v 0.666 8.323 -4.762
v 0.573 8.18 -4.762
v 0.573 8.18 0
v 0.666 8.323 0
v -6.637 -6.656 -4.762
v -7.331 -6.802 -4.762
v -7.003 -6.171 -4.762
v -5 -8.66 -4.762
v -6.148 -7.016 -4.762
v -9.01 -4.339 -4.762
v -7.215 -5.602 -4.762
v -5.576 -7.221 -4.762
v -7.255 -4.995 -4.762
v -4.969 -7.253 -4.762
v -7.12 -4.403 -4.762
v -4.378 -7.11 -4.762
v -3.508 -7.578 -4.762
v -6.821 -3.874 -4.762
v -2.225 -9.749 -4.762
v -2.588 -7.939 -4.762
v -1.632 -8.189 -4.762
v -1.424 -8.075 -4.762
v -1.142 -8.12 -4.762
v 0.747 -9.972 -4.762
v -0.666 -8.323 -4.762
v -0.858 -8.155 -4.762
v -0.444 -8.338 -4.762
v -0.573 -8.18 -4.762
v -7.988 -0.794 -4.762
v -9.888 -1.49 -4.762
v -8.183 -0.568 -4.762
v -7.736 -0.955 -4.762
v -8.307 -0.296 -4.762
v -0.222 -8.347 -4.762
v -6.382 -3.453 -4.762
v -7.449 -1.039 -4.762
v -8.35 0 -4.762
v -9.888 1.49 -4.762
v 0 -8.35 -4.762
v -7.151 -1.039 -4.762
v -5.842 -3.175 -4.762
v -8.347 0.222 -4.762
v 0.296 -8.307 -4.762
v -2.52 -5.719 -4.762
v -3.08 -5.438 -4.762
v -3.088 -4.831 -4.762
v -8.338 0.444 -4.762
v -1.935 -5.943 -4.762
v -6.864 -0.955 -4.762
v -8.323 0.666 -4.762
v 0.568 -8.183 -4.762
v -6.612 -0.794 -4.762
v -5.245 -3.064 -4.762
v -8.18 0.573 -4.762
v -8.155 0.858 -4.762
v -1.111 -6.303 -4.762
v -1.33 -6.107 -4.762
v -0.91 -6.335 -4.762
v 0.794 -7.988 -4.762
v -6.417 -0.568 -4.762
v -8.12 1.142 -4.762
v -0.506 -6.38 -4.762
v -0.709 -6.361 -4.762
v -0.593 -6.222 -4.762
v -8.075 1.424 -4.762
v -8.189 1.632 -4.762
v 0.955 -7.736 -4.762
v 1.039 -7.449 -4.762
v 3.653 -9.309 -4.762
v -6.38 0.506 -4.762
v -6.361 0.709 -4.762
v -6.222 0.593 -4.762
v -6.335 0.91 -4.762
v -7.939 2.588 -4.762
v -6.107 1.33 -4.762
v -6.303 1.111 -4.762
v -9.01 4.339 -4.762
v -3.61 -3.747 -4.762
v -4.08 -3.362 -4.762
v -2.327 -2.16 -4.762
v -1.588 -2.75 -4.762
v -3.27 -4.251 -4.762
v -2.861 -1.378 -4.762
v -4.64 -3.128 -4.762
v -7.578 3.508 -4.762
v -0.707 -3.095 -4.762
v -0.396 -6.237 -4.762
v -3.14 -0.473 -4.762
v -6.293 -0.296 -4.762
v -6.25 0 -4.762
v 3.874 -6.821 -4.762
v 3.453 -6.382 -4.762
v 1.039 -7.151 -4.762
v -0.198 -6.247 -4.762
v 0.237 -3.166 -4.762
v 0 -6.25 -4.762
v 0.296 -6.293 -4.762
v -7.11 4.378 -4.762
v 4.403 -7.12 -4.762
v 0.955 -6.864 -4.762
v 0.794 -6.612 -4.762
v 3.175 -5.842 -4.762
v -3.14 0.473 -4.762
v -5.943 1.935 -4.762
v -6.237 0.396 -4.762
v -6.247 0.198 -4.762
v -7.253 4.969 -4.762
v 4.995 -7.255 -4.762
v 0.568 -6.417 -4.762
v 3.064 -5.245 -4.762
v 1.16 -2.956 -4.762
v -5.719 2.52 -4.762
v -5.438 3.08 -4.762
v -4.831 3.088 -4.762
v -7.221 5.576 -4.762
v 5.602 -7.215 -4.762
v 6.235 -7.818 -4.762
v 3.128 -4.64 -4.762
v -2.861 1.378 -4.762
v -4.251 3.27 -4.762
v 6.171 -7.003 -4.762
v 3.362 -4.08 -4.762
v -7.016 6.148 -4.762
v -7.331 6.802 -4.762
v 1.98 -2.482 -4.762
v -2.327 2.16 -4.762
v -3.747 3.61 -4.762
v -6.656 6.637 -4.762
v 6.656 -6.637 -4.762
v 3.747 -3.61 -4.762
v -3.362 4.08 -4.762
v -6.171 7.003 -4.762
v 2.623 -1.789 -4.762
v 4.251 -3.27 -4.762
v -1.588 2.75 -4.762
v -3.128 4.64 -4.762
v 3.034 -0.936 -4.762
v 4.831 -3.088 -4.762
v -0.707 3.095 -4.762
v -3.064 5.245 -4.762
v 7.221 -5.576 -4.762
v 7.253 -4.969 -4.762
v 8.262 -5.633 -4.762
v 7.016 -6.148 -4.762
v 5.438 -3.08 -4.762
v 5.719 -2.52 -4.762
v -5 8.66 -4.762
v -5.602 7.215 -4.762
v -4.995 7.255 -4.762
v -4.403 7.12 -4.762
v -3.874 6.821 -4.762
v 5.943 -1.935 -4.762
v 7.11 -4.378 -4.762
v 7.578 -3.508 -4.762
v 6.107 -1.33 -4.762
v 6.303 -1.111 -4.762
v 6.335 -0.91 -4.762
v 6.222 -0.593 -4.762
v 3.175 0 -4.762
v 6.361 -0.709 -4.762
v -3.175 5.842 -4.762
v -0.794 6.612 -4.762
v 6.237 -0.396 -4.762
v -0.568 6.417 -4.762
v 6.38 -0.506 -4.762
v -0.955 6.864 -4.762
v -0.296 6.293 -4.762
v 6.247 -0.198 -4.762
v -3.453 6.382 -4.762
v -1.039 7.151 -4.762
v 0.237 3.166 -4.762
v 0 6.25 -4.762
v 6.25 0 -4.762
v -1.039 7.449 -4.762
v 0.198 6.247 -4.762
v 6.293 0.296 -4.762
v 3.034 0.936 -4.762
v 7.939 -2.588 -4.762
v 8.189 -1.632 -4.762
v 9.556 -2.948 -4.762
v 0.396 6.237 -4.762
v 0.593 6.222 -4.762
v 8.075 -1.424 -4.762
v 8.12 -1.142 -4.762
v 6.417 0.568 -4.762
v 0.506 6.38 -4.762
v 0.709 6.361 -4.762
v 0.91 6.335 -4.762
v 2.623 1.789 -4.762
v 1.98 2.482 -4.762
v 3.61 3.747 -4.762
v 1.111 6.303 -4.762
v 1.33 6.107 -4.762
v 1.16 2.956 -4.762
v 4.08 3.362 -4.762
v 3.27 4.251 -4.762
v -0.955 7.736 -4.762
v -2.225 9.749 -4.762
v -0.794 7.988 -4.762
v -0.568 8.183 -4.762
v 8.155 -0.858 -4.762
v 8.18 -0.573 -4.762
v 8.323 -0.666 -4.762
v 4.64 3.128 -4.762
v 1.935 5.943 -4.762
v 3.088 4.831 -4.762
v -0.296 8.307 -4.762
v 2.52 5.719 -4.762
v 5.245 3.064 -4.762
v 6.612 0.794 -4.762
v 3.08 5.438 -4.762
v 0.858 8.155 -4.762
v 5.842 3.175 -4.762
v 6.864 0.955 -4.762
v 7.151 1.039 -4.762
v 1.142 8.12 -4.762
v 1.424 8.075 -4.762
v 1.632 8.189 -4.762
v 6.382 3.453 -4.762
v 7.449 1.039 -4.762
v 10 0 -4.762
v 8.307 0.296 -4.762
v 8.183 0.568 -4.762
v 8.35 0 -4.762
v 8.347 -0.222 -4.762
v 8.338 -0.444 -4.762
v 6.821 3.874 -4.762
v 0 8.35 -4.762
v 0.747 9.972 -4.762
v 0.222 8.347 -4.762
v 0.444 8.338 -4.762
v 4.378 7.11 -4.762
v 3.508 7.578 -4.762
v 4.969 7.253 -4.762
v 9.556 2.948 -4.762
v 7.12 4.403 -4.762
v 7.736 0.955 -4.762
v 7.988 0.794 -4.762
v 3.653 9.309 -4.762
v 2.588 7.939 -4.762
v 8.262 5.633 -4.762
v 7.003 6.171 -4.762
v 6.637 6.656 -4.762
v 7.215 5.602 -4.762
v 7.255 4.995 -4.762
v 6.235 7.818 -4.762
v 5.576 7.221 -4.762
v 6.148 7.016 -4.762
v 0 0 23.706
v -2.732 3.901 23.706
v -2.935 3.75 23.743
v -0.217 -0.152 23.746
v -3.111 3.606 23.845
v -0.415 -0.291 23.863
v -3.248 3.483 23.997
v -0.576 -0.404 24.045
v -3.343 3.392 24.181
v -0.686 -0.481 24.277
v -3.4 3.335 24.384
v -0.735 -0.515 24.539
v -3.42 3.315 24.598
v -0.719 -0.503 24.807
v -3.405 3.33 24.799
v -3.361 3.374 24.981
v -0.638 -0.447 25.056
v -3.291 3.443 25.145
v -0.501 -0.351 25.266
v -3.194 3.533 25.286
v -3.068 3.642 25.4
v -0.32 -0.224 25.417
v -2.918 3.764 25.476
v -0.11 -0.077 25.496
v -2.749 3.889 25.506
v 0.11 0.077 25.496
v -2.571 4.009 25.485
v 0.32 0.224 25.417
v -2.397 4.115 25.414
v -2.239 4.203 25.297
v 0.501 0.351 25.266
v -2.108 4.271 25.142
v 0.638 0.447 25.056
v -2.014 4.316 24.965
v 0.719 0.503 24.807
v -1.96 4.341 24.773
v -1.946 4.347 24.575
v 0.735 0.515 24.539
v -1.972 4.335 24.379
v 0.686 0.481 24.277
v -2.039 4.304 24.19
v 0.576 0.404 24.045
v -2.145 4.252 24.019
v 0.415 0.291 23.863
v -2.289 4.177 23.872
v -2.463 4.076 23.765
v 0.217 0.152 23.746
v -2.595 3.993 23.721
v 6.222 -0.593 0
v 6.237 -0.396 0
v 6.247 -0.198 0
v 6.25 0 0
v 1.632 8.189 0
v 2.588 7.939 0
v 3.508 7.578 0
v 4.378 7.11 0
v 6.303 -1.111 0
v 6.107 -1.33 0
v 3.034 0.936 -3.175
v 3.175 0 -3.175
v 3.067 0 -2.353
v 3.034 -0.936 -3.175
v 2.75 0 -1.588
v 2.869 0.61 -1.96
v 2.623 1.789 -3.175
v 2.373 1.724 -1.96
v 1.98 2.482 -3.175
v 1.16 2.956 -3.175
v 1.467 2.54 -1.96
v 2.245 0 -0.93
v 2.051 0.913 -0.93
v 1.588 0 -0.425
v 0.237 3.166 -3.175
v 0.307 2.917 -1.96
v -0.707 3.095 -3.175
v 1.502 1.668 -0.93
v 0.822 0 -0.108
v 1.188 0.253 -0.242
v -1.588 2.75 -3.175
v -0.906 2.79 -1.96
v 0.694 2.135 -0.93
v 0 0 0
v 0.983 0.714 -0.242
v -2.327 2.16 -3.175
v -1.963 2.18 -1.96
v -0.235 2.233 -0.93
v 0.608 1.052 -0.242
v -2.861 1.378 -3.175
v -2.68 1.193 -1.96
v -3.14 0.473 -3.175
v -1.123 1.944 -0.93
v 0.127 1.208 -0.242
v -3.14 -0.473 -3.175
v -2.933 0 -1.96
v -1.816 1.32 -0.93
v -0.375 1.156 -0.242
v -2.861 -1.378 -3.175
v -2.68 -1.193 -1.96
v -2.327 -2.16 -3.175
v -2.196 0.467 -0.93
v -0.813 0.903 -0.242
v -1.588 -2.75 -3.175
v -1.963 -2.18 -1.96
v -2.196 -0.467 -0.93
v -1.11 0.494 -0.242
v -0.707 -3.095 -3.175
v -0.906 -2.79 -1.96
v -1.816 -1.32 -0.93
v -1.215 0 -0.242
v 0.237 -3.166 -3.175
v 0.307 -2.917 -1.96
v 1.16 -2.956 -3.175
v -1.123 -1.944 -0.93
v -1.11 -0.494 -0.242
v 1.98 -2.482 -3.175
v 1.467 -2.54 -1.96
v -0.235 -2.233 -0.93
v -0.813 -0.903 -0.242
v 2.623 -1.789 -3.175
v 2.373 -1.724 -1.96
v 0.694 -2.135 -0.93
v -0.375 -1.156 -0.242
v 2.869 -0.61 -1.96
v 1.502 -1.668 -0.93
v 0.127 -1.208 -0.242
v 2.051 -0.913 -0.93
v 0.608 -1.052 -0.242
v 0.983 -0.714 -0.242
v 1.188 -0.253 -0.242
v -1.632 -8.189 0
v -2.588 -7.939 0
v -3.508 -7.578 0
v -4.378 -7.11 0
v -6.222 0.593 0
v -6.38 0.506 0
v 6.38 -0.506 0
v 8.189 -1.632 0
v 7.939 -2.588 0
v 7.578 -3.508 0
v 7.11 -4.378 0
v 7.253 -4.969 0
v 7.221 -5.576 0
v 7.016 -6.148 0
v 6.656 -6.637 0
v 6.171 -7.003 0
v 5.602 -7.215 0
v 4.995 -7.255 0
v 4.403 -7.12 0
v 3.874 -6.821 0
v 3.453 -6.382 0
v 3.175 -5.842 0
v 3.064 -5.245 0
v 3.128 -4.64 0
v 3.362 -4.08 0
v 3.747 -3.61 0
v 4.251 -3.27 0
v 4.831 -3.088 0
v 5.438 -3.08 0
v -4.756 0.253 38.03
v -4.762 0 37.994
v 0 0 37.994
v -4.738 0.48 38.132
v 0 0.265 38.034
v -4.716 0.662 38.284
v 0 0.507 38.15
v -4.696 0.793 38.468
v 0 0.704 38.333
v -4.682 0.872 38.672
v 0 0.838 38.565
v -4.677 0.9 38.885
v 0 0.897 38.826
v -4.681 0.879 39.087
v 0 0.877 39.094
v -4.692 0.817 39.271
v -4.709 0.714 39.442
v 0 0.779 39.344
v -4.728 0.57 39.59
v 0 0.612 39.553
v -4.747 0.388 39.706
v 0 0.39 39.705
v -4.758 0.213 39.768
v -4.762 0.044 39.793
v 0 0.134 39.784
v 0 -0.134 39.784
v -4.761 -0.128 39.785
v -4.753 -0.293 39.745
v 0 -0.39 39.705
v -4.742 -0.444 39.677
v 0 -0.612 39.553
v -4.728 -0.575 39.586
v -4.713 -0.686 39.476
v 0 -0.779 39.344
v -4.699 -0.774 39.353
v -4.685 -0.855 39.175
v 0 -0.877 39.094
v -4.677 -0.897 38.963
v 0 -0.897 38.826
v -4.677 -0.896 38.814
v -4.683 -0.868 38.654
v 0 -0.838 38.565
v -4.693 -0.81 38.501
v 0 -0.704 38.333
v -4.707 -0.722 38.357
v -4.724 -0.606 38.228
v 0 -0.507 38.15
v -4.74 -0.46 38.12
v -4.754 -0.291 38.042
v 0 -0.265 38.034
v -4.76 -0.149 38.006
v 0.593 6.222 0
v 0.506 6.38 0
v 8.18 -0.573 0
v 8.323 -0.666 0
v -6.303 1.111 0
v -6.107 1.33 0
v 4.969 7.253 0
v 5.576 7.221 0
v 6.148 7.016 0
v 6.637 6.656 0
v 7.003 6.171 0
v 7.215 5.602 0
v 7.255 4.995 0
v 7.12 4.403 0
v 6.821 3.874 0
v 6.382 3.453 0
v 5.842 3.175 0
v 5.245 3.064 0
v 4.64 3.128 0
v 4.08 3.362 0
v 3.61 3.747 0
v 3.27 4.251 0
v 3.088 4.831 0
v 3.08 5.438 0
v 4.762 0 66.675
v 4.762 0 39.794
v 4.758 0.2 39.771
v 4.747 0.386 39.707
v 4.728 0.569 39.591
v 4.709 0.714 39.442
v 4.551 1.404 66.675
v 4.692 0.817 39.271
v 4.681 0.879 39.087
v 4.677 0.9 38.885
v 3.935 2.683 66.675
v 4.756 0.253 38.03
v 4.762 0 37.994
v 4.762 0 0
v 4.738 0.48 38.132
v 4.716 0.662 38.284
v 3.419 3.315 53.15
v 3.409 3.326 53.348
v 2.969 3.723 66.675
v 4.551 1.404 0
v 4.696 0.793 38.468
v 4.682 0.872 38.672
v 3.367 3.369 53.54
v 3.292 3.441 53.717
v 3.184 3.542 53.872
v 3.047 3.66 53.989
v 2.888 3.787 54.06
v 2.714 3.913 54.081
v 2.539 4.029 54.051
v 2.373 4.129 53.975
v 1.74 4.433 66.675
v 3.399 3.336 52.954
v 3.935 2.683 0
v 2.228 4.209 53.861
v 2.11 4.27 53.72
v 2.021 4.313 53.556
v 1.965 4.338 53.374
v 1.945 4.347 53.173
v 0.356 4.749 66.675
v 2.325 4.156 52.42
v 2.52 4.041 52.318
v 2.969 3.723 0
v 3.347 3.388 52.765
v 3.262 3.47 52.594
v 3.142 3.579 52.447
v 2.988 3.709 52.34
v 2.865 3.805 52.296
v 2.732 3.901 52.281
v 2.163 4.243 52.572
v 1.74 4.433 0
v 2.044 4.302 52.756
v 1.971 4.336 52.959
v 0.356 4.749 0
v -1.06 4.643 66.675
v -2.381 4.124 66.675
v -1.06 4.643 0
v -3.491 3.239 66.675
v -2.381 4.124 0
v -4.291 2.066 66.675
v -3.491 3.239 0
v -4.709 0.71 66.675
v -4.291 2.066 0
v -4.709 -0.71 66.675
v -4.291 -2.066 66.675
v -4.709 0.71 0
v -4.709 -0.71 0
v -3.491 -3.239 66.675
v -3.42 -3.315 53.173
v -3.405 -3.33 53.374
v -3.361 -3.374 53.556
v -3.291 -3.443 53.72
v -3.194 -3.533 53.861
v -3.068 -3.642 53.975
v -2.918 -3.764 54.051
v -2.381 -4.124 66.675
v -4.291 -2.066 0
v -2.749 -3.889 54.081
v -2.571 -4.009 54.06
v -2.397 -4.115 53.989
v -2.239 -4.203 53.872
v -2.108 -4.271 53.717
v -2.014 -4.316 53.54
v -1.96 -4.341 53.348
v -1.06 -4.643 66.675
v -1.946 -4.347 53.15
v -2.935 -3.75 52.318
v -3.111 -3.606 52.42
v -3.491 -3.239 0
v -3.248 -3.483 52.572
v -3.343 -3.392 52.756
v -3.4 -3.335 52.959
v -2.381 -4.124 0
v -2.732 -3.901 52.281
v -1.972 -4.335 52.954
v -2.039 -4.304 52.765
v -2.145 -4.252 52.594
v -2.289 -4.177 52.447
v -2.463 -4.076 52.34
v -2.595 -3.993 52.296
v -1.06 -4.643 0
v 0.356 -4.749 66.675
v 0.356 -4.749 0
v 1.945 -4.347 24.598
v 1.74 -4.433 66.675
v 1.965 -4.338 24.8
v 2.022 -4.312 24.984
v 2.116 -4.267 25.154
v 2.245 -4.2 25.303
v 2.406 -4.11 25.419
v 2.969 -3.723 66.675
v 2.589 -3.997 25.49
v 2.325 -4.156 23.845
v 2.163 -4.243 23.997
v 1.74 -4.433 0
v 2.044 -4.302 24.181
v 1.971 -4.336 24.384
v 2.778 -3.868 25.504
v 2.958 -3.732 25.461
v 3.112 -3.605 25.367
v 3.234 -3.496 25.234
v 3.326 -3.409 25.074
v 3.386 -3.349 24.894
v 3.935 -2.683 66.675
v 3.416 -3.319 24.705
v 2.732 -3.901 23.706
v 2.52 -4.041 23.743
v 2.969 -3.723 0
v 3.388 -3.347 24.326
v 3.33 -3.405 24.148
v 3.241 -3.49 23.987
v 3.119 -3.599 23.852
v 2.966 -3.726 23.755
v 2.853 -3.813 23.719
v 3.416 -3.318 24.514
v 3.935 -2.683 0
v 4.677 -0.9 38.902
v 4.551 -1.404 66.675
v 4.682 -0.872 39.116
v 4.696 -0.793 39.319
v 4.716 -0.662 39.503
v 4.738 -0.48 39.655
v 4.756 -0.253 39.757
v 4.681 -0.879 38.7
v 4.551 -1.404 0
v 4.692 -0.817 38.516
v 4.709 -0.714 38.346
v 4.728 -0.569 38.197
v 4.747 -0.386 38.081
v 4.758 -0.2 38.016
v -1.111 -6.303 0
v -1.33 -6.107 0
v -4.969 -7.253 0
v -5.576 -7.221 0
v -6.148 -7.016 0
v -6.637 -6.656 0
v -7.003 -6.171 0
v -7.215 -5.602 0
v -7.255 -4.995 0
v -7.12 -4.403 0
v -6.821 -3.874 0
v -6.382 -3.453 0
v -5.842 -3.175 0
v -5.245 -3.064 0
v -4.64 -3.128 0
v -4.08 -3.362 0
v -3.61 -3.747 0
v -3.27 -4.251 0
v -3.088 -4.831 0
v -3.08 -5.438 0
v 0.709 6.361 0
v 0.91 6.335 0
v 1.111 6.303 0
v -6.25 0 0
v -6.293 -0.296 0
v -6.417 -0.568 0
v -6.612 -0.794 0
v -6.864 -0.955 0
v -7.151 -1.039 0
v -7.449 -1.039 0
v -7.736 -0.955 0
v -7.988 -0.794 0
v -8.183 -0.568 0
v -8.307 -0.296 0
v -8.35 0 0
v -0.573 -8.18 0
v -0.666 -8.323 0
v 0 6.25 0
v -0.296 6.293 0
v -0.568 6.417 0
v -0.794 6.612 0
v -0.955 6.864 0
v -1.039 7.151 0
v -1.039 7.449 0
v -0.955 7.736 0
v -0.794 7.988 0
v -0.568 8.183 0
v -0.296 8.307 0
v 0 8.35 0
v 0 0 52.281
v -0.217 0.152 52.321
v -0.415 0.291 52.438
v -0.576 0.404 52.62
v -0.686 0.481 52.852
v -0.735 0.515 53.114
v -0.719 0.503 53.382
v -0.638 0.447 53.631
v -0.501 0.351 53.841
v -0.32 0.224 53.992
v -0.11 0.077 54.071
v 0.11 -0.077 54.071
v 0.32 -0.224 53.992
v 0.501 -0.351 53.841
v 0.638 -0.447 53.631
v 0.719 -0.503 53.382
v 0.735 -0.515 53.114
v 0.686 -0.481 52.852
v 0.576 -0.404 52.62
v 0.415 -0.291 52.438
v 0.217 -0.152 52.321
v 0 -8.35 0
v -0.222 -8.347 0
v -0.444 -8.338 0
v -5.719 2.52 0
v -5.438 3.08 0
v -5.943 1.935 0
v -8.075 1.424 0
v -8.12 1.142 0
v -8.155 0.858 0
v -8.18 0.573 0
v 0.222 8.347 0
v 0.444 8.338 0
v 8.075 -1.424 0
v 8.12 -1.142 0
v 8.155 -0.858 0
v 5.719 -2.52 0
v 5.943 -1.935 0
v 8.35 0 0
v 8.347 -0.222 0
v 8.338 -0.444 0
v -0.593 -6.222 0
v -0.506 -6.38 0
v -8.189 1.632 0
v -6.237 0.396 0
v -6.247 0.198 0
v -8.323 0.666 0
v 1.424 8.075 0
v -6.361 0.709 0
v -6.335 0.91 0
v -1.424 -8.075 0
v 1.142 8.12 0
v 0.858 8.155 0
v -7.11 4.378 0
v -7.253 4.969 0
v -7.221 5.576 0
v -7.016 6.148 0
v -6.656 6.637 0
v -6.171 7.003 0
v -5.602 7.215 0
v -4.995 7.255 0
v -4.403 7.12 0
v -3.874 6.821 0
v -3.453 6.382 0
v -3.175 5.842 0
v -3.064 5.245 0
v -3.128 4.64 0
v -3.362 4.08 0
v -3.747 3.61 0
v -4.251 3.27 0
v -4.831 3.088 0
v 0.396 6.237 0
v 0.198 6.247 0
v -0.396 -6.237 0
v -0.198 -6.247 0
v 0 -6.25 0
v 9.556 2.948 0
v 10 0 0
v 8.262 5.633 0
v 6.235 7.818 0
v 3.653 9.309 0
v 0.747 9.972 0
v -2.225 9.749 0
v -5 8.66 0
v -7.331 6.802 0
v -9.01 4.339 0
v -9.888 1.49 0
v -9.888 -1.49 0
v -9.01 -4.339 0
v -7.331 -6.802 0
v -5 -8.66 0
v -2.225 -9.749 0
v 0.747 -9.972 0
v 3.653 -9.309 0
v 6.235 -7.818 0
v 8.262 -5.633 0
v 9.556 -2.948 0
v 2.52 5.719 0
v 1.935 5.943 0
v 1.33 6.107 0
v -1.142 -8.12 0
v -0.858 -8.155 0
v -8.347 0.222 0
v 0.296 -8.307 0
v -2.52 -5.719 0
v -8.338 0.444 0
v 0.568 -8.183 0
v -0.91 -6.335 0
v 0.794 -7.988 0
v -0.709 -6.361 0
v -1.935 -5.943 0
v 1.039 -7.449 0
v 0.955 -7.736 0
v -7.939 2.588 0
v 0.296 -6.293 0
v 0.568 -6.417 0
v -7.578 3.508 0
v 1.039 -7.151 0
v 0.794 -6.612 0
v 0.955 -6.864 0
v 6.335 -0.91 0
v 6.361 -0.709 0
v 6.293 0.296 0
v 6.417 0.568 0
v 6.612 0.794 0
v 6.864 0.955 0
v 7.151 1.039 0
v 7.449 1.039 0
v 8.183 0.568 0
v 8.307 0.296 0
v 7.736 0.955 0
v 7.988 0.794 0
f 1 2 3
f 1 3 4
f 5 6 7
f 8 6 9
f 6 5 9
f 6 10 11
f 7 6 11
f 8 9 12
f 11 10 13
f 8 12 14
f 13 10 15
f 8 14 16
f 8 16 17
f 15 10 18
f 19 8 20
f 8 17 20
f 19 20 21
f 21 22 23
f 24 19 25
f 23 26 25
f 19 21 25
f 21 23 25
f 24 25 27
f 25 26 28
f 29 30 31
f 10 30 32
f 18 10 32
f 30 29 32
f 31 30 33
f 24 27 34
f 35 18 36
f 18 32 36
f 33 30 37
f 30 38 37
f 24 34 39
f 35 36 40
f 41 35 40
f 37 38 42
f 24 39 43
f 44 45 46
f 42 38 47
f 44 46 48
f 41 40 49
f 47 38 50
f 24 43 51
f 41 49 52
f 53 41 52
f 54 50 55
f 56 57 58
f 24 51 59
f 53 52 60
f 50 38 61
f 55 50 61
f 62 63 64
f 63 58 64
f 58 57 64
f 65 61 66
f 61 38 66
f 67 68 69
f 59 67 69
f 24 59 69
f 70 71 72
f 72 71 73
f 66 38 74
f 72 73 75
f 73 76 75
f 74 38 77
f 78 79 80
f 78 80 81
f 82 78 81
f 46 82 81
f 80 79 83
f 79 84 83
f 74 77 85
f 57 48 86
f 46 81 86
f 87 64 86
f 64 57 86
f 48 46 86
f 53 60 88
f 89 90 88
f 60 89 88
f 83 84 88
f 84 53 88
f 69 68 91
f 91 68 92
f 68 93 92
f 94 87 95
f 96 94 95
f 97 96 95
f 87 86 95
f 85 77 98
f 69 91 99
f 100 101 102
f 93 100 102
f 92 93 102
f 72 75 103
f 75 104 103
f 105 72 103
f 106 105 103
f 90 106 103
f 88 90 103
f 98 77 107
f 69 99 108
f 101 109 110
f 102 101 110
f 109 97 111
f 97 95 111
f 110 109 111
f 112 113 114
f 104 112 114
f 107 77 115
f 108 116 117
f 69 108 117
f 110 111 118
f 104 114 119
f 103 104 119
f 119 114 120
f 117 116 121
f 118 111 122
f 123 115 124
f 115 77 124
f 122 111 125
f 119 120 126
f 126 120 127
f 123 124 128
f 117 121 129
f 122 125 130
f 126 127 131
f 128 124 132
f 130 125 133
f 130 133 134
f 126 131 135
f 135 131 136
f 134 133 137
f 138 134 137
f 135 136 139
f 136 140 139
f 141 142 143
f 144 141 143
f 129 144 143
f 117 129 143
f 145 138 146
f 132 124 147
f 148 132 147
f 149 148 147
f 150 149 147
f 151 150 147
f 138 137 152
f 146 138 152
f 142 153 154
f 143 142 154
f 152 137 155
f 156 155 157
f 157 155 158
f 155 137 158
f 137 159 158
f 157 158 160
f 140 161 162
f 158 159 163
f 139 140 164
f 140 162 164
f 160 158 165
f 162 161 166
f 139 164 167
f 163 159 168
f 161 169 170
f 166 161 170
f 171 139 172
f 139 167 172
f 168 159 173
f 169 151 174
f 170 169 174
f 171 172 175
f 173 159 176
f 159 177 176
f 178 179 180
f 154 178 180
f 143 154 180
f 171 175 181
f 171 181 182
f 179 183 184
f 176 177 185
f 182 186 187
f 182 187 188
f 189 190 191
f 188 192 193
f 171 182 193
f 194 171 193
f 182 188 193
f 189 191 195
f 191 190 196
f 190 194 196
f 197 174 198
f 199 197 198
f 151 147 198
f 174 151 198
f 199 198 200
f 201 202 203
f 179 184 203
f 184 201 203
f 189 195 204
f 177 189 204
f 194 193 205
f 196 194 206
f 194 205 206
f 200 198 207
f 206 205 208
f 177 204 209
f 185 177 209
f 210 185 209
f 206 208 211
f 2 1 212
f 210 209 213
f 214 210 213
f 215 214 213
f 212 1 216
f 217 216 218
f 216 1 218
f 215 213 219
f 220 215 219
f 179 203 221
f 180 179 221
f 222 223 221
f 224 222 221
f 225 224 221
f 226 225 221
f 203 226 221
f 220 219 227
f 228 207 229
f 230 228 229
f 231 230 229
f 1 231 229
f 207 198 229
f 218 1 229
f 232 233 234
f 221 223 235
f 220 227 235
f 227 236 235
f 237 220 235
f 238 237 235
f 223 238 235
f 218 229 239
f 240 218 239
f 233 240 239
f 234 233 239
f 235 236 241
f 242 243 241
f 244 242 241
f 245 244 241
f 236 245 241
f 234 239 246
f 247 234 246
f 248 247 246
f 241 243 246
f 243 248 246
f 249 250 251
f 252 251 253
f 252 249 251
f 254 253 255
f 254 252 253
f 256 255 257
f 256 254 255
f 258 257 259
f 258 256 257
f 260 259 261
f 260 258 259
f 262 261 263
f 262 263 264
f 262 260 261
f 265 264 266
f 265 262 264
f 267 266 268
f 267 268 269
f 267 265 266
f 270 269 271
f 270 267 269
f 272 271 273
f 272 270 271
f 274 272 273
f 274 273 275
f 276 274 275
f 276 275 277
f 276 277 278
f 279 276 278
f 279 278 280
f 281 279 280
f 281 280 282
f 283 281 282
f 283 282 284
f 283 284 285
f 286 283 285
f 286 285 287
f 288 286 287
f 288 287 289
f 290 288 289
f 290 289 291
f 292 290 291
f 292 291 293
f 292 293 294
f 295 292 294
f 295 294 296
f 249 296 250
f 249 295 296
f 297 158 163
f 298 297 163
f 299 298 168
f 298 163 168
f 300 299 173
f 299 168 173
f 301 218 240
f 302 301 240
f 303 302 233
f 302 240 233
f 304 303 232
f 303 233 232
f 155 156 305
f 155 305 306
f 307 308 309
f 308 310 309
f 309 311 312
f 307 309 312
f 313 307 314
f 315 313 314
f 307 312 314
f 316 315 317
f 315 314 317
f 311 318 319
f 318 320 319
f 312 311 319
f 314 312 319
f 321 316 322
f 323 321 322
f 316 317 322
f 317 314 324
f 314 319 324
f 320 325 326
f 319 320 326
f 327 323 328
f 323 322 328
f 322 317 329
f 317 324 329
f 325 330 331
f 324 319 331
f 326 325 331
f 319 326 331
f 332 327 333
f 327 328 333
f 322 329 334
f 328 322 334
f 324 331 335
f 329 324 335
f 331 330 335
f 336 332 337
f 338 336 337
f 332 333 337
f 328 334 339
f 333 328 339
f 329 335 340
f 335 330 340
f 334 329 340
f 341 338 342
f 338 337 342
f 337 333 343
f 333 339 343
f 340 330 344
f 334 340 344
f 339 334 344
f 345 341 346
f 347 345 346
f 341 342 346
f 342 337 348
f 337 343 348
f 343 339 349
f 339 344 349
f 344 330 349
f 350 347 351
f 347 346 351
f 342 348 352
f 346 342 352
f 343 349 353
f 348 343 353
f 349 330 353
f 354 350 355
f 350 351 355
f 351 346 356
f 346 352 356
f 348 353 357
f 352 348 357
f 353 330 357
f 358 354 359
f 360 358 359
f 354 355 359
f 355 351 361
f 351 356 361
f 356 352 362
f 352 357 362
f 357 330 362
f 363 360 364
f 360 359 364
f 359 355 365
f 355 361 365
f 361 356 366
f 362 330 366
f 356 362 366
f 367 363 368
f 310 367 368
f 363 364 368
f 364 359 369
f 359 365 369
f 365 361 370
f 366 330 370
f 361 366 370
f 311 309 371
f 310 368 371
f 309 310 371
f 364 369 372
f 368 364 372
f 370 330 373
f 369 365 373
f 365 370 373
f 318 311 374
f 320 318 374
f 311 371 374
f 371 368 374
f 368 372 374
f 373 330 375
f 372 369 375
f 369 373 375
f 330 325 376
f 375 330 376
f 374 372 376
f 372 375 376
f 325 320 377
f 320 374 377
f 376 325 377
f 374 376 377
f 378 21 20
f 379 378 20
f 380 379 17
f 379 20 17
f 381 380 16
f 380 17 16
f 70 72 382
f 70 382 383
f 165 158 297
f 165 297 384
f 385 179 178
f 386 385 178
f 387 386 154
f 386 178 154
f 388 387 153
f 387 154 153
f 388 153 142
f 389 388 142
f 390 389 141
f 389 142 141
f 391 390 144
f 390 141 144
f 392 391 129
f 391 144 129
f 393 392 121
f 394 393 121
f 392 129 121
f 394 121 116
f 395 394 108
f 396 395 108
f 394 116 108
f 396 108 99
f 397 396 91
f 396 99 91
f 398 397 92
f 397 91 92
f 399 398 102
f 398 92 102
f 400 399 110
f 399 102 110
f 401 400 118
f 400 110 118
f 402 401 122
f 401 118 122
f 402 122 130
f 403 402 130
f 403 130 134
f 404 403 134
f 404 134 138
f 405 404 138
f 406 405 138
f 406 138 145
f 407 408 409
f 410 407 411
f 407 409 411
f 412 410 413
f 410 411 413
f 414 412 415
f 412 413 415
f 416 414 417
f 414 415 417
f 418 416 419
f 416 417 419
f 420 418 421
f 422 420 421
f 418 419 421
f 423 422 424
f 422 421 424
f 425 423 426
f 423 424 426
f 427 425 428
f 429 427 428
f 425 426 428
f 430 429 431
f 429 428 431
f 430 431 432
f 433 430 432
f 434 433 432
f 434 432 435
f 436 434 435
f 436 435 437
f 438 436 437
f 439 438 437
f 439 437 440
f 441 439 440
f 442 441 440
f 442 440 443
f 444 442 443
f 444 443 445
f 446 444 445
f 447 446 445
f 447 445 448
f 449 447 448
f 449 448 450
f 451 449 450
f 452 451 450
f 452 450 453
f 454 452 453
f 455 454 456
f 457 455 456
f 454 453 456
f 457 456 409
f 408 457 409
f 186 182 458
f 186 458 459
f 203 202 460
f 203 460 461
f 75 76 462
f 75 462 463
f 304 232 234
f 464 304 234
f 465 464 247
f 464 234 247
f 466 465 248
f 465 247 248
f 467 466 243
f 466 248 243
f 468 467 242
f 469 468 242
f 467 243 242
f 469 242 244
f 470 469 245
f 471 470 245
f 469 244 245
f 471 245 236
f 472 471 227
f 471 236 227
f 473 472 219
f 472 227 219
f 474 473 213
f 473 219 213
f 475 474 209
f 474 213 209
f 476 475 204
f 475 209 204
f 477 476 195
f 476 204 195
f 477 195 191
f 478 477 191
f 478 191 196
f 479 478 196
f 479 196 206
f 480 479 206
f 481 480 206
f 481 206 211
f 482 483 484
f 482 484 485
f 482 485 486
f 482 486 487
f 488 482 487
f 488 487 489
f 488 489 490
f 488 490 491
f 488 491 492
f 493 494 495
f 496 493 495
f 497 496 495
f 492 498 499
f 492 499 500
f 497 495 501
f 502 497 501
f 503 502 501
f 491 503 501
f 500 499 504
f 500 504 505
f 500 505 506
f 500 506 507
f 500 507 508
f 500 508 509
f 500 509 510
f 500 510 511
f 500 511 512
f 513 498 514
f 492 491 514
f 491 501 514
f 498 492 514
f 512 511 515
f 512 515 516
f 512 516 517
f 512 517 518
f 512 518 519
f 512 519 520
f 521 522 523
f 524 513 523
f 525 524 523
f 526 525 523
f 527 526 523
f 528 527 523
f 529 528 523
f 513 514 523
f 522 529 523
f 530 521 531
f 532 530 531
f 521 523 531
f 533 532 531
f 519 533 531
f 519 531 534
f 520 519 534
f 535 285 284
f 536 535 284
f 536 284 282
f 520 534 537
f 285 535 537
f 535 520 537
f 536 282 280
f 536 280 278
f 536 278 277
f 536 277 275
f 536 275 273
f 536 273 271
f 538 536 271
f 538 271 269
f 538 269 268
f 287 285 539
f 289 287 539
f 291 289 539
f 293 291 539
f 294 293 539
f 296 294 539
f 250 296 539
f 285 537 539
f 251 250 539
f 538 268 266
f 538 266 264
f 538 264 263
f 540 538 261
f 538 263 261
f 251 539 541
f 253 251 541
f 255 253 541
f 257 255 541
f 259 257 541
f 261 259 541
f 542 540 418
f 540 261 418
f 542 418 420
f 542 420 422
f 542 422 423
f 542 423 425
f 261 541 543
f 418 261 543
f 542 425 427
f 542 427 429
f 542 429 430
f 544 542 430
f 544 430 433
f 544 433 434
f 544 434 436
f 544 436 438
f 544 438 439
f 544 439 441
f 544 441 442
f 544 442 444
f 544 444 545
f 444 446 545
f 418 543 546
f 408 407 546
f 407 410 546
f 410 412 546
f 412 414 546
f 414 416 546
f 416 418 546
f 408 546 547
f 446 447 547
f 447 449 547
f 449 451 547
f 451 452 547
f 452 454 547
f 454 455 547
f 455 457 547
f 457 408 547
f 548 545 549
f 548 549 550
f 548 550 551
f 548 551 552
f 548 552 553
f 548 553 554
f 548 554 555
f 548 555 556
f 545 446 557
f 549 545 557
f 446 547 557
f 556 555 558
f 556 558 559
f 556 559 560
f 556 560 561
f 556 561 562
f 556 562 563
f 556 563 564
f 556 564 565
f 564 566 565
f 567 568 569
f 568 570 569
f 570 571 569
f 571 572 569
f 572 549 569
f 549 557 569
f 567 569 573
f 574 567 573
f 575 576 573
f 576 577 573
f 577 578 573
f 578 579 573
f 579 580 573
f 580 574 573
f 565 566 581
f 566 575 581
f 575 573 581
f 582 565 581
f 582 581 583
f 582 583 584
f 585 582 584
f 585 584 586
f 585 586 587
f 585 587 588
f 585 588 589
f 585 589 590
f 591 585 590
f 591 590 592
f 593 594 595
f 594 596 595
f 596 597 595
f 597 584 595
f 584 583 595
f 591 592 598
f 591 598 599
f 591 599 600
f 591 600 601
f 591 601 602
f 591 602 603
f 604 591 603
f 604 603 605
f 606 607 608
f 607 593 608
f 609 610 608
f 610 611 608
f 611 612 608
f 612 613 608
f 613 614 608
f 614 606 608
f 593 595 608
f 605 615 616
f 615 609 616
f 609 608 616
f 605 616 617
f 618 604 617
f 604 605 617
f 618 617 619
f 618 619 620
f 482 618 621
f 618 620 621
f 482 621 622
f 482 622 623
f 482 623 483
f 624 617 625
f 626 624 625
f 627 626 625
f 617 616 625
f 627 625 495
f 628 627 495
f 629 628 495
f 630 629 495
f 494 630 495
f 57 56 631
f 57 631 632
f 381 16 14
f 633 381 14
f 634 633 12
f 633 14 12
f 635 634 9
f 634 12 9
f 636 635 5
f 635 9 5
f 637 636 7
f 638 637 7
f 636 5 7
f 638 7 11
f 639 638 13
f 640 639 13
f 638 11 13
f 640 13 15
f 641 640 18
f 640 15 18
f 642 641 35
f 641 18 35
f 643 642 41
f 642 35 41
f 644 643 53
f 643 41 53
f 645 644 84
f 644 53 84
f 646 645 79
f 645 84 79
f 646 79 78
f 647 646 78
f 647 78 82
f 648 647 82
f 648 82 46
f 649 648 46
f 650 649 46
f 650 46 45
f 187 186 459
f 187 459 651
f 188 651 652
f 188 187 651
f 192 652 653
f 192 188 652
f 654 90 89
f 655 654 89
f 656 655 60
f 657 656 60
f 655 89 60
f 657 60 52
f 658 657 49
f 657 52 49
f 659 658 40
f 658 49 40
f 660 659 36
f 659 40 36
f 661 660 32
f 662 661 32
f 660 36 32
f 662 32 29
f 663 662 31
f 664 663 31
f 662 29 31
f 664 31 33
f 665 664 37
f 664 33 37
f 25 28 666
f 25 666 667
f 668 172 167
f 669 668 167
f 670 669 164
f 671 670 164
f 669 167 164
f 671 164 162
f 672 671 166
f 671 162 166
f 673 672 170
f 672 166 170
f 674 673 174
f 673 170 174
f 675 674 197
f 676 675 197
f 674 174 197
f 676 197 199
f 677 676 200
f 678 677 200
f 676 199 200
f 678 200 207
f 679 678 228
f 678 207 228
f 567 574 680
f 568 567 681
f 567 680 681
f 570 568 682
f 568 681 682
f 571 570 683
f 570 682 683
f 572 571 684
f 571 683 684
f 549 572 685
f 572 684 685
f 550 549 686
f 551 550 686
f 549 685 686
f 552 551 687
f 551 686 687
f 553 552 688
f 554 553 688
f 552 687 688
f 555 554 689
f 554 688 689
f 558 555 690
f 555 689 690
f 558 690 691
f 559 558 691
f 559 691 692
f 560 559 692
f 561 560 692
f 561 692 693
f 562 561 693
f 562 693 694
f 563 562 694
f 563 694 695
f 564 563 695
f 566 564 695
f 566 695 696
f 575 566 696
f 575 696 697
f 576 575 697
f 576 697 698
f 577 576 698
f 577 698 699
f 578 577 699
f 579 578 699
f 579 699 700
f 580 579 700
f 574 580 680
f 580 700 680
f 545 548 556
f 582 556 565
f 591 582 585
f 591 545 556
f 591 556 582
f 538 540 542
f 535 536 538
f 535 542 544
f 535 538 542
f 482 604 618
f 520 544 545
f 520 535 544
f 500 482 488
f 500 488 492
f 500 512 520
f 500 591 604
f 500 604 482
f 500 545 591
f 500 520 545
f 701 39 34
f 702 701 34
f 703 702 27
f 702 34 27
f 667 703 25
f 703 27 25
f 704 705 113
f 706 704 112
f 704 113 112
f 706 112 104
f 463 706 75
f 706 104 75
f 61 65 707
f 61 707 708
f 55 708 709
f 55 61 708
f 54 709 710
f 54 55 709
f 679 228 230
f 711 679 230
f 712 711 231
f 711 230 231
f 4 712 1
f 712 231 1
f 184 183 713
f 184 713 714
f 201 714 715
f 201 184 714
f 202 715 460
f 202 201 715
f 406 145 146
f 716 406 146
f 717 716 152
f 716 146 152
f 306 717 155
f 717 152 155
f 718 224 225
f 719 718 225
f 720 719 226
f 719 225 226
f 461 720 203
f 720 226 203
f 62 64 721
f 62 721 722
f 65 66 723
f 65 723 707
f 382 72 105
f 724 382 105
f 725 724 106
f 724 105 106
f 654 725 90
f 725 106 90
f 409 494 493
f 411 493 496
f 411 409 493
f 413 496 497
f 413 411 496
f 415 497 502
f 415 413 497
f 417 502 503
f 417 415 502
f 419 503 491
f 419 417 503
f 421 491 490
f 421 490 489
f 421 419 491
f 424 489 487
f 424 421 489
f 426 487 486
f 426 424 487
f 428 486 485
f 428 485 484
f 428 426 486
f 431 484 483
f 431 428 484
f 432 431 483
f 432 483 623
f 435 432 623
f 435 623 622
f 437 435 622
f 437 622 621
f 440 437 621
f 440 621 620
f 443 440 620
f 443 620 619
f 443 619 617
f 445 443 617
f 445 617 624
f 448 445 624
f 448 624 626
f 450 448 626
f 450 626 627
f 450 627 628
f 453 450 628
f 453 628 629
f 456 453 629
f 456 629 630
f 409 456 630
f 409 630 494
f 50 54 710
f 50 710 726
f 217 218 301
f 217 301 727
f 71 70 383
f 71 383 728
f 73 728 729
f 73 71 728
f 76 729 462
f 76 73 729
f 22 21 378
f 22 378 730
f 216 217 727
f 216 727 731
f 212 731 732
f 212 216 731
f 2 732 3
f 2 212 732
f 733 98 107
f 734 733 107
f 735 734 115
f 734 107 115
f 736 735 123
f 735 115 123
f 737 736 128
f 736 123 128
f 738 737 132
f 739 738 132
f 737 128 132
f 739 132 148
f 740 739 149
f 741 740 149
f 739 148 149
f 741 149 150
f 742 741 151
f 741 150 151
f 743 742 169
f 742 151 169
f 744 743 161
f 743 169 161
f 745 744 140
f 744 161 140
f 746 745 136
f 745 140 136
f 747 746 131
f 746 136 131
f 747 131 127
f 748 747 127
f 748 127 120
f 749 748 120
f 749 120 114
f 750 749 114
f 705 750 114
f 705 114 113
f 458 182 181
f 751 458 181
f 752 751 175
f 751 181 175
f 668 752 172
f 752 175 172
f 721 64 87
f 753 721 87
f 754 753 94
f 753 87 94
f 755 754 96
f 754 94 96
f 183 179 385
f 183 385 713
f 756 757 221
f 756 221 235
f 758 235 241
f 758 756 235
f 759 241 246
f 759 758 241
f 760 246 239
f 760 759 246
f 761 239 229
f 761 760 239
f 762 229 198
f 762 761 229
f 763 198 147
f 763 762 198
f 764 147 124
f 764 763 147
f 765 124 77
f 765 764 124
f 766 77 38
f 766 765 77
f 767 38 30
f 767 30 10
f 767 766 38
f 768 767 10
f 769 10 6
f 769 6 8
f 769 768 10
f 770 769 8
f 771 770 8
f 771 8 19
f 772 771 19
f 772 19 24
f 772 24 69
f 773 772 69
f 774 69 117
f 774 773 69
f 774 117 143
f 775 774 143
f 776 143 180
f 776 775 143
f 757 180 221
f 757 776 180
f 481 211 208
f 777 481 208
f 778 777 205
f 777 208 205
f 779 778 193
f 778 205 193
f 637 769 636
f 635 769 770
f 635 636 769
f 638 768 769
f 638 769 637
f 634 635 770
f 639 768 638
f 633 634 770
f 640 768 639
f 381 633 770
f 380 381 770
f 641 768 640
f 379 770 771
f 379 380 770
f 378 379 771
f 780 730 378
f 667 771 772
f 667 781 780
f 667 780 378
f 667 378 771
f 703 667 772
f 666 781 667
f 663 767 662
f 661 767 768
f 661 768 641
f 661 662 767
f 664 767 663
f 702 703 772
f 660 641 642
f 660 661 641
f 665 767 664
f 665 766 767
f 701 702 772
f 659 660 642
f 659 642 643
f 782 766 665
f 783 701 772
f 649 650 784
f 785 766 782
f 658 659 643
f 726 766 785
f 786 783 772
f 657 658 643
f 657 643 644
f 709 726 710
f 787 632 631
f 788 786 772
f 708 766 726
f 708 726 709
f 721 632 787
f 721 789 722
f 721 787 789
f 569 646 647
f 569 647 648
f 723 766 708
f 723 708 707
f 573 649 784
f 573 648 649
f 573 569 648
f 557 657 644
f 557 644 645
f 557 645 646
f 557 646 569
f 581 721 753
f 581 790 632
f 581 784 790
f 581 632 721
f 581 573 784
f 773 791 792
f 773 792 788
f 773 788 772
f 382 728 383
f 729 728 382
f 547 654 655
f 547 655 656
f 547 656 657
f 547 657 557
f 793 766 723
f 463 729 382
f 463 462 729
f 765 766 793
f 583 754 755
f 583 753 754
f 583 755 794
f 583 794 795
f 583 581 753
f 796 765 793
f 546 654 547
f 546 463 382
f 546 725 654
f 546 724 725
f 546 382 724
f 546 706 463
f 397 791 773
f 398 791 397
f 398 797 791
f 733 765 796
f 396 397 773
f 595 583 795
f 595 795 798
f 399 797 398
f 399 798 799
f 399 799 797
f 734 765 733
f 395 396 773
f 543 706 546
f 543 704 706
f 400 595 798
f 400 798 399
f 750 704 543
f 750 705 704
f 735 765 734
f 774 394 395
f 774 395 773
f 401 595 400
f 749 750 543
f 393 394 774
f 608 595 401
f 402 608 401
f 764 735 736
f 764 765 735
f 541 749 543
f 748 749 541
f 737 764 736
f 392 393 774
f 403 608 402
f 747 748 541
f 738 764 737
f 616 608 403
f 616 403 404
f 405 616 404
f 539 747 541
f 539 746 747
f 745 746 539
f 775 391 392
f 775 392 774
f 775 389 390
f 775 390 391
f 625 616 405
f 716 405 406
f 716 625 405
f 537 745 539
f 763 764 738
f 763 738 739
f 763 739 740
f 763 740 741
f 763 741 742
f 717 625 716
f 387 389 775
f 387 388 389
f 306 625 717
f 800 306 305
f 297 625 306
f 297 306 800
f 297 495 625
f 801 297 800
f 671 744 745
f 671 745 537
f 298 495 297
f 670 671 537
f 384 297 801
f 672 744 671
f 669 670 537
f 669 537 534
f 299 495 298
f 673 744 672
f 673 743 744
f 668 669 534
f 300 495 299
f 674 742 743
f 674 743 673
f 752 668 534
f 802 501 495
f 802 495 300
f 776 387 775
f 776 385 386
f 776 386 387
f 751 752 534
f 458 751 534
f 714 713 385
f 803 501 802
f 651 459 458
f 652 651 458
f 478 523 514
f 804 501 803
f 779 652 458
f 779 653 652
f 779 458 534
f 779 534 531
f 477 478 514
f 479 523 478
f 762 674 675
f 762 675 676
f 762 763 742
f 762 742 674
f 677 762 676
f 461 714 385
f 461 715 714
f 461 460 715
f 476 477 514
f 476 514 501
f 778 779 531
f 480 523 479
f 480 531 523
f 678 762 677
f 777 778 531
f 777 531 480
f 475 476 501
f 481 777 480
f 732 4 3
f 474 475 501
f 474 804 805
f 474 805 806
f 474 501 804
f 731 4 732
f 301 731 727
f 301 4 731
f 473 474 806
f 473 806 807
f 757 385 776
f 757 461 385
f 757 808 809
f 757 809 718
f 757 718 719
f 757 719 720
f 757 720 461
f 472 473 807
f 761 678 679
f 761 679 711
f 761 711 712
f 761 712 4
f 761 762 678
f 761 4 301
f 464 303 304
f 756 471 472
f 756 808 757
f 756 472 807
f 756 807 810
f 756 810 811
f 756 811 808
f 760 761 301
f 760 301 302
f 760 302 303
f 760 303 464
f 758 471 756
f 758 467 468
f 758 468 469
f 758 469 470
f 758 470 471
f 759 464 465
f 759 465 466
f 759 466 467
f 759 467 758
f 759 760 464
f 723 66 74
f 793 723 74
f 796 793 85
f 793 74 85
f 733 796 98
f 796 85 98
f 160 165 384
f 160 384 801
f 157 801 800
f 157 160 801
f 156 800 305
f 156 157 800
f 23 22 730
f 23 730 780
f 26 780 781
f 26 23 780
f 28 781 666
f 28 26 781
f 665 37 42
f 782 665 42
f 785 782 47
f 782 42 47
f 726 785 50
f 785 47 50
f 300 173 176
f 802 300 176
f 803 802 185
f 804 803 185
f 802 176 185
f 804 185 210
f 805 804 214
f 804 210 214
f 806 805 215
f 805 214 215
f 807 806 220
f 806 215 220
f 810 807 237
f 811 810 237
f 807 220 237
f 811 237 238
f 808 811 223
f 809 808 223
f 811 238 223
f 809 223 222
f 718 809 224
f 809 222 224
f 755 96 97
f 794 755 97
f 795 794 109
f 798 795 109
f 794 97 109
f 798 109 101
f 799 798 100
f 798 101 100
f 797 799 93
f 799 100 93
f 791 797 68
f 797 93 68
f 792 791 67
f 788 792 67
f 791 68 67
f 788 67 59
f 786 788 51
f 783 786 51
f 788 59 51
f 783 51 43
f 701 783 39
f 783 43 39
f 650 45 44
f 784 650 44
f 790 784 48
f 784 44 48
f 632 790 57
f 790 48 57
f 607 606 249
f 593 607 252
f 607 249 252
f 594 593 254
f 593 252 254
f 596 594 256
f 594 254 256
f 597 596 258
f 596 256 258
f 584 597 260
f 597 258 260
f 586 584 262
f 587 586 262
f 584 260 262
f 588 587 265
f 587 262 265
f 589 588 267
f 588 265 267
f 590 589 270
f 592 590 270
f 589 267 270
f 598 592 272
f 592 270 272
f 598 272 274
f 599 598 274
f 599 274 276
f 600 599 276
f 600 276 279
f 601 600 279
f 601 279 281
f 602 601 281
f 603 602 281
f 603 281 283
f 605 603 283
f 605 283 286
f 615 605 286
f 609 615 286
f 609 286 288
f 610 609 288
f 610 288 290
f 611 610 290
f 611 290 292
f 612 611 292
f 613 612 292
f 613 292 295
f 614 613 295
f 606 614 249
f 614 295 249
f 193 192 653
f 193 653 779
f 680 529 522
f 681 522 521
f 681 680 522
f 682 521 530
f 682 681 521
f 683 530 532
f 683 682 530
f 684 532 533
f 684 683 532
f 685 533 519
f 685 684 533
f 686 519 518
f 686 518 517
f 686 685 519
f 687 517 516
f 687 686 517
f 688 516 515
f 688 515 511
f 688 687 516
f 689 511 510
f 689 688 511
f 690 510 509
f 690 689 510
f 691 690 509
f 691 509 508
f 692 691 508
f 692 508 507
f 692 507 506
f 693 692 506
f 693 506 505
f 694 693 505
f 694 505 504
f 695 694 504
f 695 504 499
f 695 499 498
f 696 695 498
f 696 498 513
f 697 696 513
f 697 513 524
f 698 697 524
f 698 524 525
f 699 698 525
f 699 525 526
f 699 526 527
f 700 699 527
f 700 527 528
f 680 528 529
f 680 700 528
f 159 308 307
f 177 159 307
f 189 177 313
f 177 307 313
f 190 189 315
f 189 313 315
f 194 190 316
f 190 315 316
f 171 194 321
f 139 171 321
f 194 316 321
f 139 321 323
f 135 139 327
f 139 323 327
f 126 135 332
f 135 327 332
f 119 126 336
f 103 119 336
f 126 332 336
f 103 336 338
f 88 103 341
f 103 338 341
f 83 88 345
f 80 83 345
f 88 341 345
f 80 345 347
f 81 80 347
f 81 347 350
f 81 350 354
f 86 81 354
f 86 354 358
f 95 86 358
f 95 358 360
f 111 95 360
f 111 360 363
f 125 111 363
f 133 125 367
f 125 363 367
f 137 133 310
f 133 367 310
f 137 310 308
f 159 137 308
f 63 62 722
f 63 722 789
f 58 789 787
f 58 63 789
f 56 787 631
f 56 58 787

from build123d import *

# Parameters (mm, degrees)
SKETCH1_R               = 4.7625
BOSS_EXTRUDE1_DEPTH     = 66.675
SKETCH1_4_R             = 9.999999939
SKETCH1_4_R_2           = 3.175
BOSS_EXTRUDE2_DEPTH     = 4.7625
FILLET1_R               = 3.175
SKETCH3_R               = 0.899999978
CUT_EXTRUDE2_DEPTH      = 10.999999939
CUT_EXTRUDE2_DEPTH_BACK = 10.999999939
SKETCH4_R               = 0.899999978
CUT_EXTRUDE3_DEPTH      = 14.927284721
CUT_EXTRUDE3_DEPTH_BACK = 14.927284721
SKETCH5_R               = 0.899999978
CUT_EXTRUDE4_DEPTH      = 14.927284721
CUT_EXTRUDE4_DEPTH_BACK = 14.927284721
CUT_EXTRUDE5_DEPTH      = 72.4375001
BOSS_EXTRUDE3_DEPTH     = 4.7625
CIRPATTERN1_COUNT       = 4


with BuildPart() as part:
    # Sketch1 → Boss-Extrude1 (new body)
    with BuildSketch(Plane.XY):
        Circle(SKETCH1_R)
    extrude(amount=BOSS_EXTRUDE1_DEPTH)

    # Sketch1<4> → Boss-Extrude2 (add)
    with BuildSketch(Plane.XY):
        Circle(SKETCH1_4_R)
        Circle(SKETCH1_4_R_2, mode=Mode.SUBTRACT)
    extrude(amount=-BOSS_EXTRUDE2_DEPTH)

    # Fillet1
    fillet1_edges = [part.edges().sort_by_distance(p)[0] for p in [
        (-3.175, 0, 0),
    ]]
    fillet(fillet1_edges, radius=FILLET1_R)

    # Sketch3 → Cut-Extrude2 (cut, two sides)
    with BuildSketch(Plane(origin=(0, 0, 0), x_dir=(0, 0, -1), z_dir=(1, 0, 0))) as cut_extrude2_sk:
        with Locations((-38.89375, 0)):
            Circle(SKETCH3_R)
    extrude(amount=CUT_EXTRUDE2_DEPTH, mode=Mode.SUBTRACT)
    extrude(cut_extrude2_sk.sketch, amount=-CUT_EXTRUDE2_DEPTH_BACK, mode=Mode.SUBTRACT)

    # Sketch4 → Cut-Extrude3 (cut, two sides)
    with BuildSketch(Plane(origin=(0, 0, 0), x_dir=(0, 0, -1), z_dir=(0.573576436, 0.819152044, 0))) as cut_extrude3_sk:
        with Locations((-53.18125, 0)):
            Circle(SKETCH4_R)
    extrude(amount=CUT_EXTRUDE3_DEPTH, mode=Mode.SUBTRACT)
    extrude(cut_extrude3_sk.sketch, amount=-CUT_EXTRUDE3_DEPTH_BACK, mode=Mode.SUBTRACT)

    # Sketch5 → Cut-Extrude4 (cut, two sides)
    with BuildSketch(Plane(origin=(0, 0, 0), x_dir=(0, 0, -1), z_dir=(-0.573576436, 0.819152044, 0))) as cut_extrude4_sk:
        with Locations((-24.60625, 0)):
            Circle(SKETCH5_R)
    extrude(amount=CUT_EXTRUDE4_DEPTH, mode=Mode.SUBTRACT)
    extrude(cut_extrude4_sk.sketch, amount=-CUT_EXTRUDE4_DEPTH_BACK, mode=Mode.SUBTRACT)

    # Sketch6 → Cut-Extrude5 (cut, through all)
    with BuildSketch(Plane(origin=(0, 0, -4.7625), x_dir=(-1, 0, 0), z_dir=(0, 0, -1))):
        with BuildLine():
            ThreePointArc((0, 6.249999819), (1.050000059, 7.299999878), (0, 8.349999937))
            ThreePointArc((0, 8.349999937), (-2.275161332, 8.034061231), (-4.378152237, 7.11015344))
            ThreePointArc((-4.378152237, 7.11015344), (-6.820637013, 3.874042781), (-3.080152041, 5.438304988))
            ThreePointArc((-3.080152041, 5.438304988), (-1.592653846, 6.043670364), (0, 6.249999819))
        make_face()
    cut_extrude5 = extrude(amount=-CUT_EXTRUDE5_DEPTH, mode=Mode.SUBTRACT)

    # Sketch7 → Boss-Extrude3 (add)
    with BuildSketch(Plane(origin=(0, 0, -4.7625), x_dir=(-1, 0, 0), z_dir=(0, 0, -1))):
        with BuildLine():
            ThreePointArc((-0.506000912, 6.379965531), (-0.809595225, 6.348586667), (-1.111348298, 6.302769396))
            Line((-1.111348298, 6.302769396), (-1.329589914, 6.106937727))
            ThreePointArc((-1.329589914, 6.106937727), (-0.963002055, 6.175364344), (-0.592985752, 6.221805657))
            Line((-0.592985752, 6.221805657), (-0.506000912, 6.379965531))
        make_face()
        with BuildLine():
            Line((-1.632295539, 8.188901649), (-1.423915054, 8.075423558))
            ThreePointArc((-1.423915054, 8.075423558), (-0.999751281, 8.138826519), (-0.57285269, 8.179965741))
            Line((-0.57285269, 8.179965741), (-0.666214637, 8.323380143))
            ThreePointArc((-0.666214637, 8.323380143), (-1.151220385, 8.270259402), (-1.632295539, 8.188901649))
        make_face()
    boss_extrude3 = extrude(amount=-BOSS_EXTRUDE3_DEPTH)

    # CirPattern1: Cut-Extrude5, Boss-Extrude3 ×4 about axis
    cirpattern1_axis = Axis((0, 0, 0), (0, 0, 1))
    for i in range(1, CIRPATTERN1_COUNT):
        add(cut_extrude5.rotate(cirpattern1_axis, i * 360 / CIRPATTERN1_COUNT), mode=Mode.SUBTRACT)
        add(boss_extrude3.rotate(cirpattern1_axis, i * 360 / CIRPATTERN1_COUNT))


solid = part.part
